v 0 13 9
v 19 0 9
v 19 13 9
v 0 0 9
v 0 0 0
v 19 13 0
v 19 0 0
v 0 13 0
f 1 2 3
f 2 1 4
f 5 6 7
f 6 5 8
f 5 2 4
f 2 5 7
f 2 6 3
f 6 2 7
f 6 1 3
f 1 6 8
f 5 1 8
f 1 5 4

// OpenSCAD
// Generated by SolidPython 1.0.1 on 2020-07-29 00:46:56


cube(size = [19, 13, 9]);
/***********************************************
*********      SolidPython code:      **********
************************************************
 
# import packages: SolidPython
from solid import *
from solid.utils import *
from itertools import chain, combinations, permutations


class Resize:

    def __init__(self, scad_file):
        self.scad_file = scad_file
        #self.scad_file = import_scad(scad_file)
        # cone/cylinder param:
        self.r1 = 0
        self.r2 = 0
        self.h = 0
        # rectangular prism param:
        self.w = 0
        self.l = 0
        # ellipse param:
        self.r = 0

    # import OpenScad code (file name corresponds to shape)


    # classify shape + parameters
    def assign(self, param1, param2, param3):
        if self.scad_file == 'cone.scad':
            self.r1 = param1
            self.r2 = param2
            self.h = param3
        elif self.scad_file == 'cylinder.scad':
            self.r1 = param1
            self.r2 = param2
            self.h = param3
        elif self.scad_file == 'rectangularPrism.scad':
            self.h = param1
            self.l = param2
            self.w = param3
        else:
            self.r = param1
            self.h = param2

    # resize parameters
    def iterate(self):
        x = range(3, 20, 2)
        i = 1
        if self.scad_file == 'cone.scad':
            tempList = list(permutations(x, 2))
            for temp in tempList:
                param1 = temp[0]
                param2 = temp[1]
                filepath = 'produced_scad_files/' + 'cone' + str(param1) + '_' + str(param2) + '_' + '.scad'
                scad_render_to_file(cylinder(h=param1, r1=param2, r2=0), filepath)

        elif self.scad_file == 'cylinder.scad':
            tempList = list(permutations(x, 3))
            for temp in tempList:
                param1 = temp[0]
                param2 = temp[1]
                filepath = 'produced_scad_files/' + 'cylinder' + str(param1) + '_' + str(param2) + '_' + '.scad'
                scad_render_to_file(cylinder(h=param1, r1=param2, r2=param2), filepath)

        elif self.scad_file == 'rectangularPrism.scad':
            tempList = list(permutations(x, 3))
            for temp in tempList:
                param1 = temp[0]
                param2 = temp[1]
                param3 = temp[2]
                filepath = 'produced_scad_files/' + 'rectangularPrism' + str(param1) + '_' + str(param2) + '_' + str(
                    param3) + '.scad'
                scad_render_to_file(cube(size=(param1, param2, param3)), filepath)

        elif self.scad_file == 'ellipse.scad':
            tempList = list(permutations(x, 4))
            for temp in tempList:
                param1 = temp[0]
                param2 = temp[1]
                param3 = temp[2]
                param4 = temp[3]
                filepath = 'produced_scad_files/' + 'ellipse' + str(param1) + '_' + str(param2) + '_' + str(param3) + '_' + str(param4) + '.scad'
                scad_render_to_file(scale([param1, param2, param3])(sphere(r=param4)), filepath)

    def render_to_scadfile(self):
        scad_render_to_file(scad, 'example.scad') 
 
************************************************/
